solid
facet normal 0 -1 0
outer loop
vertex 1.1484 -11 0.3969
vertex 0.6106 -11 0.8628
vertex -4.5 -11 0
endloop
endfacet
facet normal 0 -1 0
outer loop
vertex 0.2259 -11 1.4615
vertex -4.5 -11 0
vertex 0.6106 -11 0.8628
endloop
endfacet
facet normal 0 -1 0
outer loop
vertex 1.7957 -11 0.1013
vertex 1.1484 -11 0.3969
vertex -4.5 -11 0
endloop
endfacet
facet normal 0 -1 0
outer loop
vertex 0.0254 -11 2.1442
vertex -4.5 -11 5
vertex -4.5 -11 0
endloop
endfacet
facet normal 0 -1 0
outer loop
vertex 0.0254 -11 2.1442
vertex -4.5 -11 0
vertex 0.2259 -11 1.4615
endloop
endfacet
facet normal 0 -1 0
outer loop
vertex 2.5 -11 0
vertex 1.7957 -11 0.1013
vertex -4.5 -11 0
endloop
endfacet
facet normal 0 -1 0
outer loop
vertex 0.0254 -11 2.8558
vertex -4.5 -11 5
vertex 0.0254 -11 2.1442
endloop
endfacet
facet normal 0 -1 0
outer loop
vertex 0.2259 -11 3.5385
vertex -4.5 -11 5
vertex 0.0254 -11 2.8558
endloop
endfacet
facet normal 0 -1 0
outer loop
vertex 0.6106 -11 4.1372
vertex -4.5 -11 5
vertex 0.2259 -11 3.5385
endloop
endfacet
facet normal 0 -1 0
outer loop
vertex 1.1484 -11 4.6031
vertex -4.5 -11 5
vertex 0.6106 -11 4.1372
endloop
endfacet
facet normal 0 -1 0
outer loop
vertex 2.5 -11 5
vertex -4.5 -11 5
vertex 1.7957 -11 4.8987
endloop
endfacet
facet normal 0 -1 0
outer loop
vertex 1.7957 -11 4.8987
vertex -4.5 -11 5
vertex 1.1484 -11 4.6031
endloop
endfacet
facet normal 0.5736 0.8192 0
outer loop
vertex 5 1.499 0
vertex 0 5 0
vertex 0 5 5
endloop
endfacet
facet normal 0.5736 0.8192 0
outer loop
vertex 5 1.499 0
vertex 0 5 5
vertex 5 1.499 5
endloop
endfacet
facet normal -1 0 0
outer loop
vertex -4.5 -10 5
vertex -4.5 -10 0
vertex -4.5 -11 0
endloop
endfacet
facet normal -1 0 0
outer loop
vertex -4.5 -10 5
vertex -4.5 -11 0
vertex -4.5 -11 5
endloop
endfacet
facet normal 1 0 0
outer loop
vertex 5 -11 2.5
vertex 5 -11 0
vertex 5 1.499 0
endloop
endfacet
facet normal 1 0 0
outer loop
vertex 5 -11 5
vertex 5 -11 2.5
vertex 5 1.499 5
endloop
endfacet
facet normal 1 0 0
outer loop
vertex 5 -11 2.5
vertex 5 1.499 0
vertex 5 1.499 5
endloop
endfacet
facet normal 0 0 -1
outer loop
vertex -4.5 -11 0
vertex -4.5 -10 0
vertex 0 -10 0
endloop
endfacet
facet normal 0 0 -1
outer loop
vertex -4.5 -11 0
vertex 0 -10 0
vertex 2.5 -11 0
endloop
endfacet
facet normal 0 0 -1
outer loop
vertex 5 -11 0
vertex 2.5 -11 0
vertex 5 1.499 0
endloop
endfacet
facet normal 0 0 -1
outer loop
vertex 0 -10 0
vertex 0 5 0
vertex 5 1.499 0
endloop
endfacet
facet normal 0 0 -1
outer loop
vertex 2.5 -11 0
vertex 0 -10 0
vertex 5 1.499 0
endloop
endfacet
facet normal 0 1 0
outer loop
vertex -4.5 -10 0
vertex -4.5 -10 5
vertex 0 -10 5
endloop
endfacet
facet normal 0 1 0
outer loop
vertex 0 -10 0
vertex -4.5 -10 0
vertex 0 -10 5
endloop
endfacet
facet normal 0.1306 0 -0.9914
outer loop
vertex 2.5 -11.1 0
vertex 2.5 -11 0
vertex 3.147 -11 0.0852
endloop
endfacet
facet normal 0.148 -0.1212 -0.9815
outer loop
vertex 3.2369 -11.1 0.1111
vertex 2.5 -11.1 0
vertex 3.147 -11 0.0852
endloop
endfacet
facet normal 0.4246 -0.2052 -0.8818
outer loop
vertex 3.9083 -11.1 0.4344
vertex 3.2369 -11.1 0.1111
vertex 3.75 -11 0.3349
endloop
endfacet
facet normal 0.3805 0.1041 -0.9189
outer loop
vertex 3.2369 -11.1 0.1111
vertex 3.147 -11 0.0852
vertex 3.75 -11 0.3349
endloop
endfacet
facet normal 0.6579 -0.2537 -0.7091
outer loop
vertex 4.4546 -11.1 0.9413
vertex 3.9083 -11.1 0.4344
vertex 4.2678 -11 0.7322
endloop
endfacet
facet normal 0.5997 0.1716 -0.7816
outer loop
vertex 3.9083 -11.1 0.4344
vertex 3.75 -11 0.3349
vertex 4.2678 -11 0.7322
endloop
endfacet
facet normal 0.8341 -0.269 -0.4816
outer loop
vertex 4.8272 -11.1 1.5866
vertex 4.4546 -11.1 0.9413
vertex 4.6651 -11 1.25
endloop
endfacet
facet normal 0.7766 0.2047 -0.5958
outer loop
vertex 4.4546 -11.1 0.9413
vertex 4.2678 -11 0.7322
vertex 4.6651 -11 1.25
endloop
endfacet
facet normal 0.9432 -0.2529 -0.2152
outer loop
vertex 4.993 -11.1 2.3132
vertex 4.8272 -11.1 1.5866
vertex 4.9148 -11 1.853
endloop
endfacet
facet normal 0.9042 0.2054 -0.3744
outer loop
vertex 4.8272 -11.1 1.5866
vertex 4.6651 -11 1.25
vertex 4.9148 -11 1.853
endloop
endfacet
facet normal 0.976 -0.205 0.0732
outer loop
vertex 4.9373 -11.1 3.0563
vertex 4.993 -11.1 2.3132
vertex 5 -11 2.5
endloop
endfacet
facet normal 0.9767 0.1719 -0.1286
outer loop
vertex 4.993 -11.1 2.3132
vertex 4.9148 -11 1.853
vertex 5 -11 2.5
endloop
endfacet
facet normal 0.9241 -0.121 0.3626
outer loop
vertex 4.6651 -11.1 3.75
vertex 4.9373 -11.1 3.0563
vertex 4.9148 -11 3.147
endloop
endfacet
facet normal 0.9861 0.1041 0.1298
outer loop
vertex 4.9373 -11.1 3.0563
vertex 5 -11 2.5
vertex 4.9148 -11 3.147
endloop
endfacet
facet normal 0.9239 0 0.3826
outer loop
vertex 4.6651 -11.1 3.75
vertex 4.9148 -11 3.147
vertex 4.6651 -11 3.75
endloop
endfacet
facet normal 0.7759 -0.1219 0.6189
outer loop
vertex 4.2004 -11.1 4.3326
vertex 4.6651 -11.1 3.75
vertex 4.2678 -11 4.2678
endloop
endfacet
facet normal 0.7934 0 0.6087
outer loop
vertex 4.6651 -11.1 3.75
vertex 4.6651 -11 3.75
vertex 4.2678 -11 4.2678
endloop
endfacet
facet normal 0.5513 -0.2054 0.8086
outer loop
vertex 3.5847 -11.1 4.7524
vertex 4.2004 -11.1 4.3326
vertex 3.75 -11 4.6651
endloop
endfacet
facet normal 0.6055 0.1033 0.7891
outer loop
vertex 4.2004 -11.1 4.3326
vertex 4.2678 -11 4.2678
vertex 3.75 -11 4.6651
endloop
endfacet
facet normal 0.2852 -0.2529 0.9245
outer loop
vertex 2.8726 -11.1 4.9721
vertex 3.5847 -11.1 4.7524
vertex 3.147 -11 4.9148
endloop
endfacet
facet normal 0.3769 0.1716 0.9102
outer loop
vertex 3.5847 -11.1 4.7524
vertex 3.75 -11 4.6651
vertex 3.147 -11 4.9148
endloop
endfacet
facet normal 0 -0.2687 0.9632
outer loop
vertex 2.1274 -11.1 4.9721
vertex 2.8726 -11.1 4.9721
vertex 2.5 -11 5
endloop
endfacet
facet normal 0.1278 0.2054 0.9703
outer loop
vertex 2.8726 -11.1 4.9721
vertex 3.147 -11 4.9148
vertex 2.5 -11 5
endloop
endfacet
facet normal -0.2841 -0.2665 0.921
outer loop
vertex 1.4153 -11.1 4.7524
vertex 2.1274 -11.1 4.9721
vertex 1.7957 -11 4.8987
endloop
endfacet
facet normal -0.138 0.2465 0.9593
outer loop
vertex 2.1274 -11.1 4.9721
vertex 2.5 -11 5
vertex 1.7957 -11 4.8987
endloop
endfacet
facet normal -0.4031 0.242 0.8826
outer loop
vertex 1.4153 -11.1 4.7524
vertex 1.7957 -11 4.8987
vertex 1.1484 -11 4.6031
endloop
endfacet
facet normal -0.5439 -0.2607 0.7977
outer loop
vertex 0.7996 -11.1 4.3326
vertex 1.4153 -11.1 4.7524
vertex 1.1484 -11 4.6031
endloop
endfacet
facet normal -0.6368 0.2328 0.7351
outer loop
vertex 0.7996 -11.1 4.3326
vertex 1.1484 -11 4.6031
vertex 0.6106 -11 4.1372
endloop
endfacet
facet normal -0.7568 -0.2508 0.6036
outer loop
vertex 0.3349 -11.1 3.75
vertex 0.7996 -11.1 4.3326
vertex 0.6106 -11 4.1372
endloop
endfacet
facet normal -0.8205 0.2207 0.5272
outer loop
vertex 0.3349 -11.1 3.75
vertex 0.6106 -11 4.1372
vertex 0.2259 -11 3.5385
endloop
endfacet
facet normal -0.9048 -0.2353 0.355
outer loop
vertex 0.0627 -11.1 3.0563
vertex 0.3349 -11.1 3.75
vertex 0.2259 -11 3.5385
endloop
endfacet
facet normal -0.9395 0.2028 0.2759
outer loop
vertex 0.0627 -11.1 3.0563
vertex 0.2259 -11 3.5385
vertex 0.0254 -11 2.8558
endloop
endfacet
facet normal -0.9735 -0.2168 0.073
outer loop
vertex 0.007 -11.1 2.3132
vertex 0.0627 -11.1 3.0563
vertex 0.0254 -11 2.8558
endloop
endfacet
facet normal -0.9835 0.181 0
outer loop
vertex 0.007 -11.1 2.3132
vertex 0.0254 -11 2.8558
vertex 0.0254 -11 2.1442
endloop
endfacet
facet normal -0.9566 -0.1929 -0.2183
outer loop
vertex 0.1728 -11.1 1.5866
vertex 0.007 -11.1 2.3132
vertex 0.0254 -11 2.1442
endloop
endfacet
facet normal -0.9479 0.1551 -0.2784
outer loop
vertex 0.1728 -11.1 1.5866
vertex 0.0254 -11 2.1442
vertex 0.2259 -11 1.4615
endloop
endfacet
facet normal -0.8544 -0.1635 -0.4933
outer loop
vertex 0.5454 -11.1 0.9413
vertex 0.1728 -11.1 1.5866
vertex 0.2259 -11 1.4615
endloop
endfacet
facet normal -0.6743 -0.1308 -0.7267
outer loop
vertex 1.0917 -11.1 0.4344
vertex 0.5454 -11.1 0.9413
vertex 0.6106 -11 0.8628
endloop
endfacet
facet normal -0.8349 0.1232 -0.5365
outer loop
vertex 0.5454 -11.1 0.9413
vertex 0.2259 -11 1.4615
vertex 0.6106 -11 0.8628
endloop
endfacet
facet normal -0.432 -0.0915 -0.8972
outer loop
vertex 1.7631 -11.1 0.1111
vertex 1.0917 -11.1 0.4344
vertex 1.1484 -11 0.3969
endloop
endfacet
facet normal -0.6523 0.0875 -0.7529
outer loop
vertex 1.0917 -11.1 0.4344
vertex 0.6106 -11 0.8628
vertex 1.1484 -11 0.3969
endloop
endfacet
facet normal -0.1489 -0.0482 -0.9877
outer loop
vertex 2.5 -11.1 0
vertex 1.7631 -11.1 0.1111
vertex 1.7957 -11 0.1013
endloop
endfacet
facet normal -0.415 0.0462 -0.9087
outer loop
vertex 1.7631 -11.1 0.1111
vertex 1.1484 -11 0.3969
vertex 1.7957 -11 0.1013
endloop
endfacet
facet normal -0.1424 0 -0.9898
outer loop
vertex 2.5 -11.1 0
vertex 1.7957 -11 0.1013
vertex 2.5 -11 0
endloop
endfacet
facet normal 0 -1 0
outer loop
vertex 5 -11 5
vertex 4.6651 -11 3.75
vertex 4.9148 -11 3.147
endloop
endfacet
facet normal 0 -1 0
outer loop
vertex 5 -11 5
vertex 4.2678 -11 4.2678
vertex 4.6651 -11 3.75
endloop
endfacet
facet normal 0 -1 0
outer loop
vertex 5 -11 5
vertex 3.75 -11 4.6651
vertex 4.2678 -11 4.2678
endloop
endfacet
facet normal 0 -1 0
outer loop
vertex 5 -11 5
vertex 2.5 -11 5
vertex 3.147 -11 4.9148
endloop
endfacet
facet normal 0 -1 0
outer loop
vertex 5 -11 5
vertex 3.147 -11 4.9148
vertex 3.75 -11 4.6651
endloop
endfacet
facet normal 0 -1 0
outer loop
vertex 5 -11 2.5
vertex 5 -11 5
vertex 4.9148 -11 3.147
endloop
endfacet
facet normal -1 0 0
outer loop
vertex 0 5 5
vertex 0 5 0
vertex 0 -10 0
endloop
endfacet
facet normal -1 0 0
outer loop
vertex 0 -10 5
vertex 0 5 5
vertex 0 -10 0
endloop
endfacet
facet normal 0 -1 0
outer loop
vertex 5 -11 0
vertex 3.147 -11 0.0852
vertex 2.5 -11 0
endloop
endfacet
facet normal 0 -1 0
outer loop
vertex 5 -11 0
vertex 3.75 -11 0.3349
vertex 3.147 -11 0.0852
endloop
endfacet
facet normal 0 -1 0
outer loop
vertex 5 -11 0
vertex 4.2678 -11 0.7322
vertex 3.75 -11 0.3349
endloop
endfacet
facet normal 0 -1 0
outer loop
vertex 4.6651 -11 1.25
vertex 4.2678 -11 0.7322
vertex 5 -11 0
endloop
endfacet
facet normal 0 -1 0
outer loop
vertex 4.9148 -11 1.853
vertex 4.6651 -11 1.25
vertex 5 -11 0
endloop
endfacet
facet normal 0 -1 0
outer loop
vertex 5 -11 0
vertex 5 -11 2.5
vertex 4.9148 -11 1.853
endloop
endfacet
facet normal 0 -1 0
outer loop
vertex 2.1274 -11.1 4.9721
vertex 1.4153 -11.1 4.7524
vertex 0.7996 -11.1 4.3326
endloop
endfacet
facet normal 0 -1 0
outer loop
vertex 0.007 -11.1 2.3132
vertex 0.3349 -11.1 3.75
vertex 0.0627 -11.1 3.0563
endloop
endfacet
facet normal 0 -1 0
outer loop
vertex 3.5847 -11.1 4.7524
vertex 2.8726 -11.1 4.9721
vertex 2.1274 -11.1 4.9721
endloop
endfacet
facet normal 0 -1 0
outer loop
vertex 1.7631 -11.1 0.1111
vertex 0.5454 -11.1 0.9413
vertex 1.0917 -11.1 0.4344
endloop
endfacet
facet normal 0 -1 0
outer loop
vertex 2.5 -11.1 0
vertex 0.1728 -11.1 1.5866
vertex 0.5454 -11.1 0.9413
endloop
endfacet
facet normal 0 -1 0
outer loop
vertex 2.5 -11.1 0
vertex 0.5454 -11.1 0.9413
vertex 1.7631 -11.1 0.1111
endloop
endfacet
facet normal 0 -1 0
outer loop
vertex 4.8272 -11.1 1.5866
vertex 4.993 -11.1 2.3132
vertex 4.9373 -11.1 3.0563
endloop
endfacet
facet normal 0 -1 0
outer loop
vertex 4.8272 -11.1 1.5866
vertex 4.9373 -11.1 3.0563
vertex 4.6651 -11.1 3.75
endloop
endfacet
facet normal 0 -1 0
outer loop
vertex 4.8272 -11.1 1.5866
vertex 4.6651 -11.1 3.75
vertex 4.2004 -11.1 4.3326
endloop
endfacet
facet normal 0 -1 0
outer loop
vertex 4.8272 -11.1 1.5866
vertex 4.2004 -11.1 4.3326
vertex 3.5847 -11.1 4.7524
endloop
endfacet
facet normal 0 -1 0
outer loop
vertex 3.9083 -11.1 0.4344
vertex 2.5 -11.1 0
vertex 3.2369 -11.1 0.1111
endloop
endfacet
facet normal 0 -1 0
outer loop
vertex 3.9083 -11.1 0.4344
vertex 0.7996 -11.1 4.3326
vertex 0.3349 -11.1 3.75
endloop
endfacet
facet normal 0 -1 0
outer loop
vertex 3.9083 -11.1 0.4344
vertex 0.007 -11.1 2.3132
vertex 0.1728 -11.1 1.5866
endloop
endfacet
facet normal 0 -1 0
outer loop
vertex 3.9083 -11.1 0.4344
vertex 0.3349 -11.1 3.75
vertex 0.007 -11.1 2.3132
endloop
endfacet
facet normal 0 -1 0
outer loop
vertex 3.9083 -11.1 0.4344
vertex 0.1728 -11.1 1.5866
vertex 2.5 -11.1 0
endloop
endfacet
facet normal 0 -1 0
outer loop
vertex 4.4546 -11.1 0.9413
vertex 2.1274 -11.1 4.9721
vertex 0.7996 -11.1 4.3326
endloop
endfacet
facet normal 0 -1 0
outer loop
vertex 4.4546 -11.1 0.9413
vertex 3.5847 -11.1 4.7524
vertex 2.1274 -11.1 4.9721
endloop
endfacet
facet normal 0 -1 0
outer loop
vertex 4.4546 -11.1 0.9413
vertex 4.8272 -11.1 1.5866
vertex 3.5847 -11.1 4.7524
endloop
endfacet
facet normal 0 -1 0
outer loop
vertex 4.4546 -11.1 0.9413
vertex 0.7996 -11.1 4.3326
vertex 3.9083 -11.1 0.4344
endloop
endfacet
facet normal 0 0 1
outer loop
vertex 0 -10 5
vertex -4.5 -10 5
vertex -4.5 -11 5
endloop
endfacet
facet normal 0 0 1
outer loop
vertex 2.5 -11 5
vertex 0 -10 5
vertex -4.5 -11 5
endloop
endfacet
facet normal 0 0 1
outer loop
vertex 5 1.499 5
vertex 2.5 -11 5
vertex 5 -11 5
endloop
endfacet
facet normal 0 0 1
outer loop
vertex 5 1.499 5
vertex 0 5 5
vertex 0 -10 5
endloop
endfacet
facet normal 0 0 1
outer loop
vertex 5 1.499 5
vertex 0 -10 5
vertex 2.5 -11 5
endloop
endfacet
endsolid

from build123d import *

# Parameters (mm, degrees)
BOSS_EXTRUDE1_DEPTH = 5
SKETCH2_W           = 9.5
SKETCH2_H           = 5
BOSS_EXTRUDE2_DEPTH = 1
SKETCH3_R           = 2.5
BOSS_EXTRUDE3_DEPTH = 0.1


with BuildPart() as part:
    # Sketch1 → Boss-Extrude1 (new body)
    with BuildSketch(Plane.XY):
        Polygon((0, 0), (0, 5), (5, 1.498962309), (5, -10), (0, -10), align=None)
    extrude(amount=BOSS_EXTRUDE1_DEPTH)

    # Sketch2 → Boss-Extrude2 (add)
    with BuildSketch(Plane.XZ.offset(10)):
        with Locations((0.25, 2.5)):
            Rectangle(SKETCH2_W, SKETCH2_H)
    extrude(amount=BOSS_EXTRUDE2_DEPTH)

    # Sketch3 → Boss-Extrude3 (add)
    with BuildSketch(Plane.XZ.offset(11)):
        with Locations(Location((2.5, 2.5, 0), (0, 0, 270))):
            Circle(SKETCH3_R)
    extrude(amount=BOSS_EXTRUDE3_DEPTH)


solid = part.part
